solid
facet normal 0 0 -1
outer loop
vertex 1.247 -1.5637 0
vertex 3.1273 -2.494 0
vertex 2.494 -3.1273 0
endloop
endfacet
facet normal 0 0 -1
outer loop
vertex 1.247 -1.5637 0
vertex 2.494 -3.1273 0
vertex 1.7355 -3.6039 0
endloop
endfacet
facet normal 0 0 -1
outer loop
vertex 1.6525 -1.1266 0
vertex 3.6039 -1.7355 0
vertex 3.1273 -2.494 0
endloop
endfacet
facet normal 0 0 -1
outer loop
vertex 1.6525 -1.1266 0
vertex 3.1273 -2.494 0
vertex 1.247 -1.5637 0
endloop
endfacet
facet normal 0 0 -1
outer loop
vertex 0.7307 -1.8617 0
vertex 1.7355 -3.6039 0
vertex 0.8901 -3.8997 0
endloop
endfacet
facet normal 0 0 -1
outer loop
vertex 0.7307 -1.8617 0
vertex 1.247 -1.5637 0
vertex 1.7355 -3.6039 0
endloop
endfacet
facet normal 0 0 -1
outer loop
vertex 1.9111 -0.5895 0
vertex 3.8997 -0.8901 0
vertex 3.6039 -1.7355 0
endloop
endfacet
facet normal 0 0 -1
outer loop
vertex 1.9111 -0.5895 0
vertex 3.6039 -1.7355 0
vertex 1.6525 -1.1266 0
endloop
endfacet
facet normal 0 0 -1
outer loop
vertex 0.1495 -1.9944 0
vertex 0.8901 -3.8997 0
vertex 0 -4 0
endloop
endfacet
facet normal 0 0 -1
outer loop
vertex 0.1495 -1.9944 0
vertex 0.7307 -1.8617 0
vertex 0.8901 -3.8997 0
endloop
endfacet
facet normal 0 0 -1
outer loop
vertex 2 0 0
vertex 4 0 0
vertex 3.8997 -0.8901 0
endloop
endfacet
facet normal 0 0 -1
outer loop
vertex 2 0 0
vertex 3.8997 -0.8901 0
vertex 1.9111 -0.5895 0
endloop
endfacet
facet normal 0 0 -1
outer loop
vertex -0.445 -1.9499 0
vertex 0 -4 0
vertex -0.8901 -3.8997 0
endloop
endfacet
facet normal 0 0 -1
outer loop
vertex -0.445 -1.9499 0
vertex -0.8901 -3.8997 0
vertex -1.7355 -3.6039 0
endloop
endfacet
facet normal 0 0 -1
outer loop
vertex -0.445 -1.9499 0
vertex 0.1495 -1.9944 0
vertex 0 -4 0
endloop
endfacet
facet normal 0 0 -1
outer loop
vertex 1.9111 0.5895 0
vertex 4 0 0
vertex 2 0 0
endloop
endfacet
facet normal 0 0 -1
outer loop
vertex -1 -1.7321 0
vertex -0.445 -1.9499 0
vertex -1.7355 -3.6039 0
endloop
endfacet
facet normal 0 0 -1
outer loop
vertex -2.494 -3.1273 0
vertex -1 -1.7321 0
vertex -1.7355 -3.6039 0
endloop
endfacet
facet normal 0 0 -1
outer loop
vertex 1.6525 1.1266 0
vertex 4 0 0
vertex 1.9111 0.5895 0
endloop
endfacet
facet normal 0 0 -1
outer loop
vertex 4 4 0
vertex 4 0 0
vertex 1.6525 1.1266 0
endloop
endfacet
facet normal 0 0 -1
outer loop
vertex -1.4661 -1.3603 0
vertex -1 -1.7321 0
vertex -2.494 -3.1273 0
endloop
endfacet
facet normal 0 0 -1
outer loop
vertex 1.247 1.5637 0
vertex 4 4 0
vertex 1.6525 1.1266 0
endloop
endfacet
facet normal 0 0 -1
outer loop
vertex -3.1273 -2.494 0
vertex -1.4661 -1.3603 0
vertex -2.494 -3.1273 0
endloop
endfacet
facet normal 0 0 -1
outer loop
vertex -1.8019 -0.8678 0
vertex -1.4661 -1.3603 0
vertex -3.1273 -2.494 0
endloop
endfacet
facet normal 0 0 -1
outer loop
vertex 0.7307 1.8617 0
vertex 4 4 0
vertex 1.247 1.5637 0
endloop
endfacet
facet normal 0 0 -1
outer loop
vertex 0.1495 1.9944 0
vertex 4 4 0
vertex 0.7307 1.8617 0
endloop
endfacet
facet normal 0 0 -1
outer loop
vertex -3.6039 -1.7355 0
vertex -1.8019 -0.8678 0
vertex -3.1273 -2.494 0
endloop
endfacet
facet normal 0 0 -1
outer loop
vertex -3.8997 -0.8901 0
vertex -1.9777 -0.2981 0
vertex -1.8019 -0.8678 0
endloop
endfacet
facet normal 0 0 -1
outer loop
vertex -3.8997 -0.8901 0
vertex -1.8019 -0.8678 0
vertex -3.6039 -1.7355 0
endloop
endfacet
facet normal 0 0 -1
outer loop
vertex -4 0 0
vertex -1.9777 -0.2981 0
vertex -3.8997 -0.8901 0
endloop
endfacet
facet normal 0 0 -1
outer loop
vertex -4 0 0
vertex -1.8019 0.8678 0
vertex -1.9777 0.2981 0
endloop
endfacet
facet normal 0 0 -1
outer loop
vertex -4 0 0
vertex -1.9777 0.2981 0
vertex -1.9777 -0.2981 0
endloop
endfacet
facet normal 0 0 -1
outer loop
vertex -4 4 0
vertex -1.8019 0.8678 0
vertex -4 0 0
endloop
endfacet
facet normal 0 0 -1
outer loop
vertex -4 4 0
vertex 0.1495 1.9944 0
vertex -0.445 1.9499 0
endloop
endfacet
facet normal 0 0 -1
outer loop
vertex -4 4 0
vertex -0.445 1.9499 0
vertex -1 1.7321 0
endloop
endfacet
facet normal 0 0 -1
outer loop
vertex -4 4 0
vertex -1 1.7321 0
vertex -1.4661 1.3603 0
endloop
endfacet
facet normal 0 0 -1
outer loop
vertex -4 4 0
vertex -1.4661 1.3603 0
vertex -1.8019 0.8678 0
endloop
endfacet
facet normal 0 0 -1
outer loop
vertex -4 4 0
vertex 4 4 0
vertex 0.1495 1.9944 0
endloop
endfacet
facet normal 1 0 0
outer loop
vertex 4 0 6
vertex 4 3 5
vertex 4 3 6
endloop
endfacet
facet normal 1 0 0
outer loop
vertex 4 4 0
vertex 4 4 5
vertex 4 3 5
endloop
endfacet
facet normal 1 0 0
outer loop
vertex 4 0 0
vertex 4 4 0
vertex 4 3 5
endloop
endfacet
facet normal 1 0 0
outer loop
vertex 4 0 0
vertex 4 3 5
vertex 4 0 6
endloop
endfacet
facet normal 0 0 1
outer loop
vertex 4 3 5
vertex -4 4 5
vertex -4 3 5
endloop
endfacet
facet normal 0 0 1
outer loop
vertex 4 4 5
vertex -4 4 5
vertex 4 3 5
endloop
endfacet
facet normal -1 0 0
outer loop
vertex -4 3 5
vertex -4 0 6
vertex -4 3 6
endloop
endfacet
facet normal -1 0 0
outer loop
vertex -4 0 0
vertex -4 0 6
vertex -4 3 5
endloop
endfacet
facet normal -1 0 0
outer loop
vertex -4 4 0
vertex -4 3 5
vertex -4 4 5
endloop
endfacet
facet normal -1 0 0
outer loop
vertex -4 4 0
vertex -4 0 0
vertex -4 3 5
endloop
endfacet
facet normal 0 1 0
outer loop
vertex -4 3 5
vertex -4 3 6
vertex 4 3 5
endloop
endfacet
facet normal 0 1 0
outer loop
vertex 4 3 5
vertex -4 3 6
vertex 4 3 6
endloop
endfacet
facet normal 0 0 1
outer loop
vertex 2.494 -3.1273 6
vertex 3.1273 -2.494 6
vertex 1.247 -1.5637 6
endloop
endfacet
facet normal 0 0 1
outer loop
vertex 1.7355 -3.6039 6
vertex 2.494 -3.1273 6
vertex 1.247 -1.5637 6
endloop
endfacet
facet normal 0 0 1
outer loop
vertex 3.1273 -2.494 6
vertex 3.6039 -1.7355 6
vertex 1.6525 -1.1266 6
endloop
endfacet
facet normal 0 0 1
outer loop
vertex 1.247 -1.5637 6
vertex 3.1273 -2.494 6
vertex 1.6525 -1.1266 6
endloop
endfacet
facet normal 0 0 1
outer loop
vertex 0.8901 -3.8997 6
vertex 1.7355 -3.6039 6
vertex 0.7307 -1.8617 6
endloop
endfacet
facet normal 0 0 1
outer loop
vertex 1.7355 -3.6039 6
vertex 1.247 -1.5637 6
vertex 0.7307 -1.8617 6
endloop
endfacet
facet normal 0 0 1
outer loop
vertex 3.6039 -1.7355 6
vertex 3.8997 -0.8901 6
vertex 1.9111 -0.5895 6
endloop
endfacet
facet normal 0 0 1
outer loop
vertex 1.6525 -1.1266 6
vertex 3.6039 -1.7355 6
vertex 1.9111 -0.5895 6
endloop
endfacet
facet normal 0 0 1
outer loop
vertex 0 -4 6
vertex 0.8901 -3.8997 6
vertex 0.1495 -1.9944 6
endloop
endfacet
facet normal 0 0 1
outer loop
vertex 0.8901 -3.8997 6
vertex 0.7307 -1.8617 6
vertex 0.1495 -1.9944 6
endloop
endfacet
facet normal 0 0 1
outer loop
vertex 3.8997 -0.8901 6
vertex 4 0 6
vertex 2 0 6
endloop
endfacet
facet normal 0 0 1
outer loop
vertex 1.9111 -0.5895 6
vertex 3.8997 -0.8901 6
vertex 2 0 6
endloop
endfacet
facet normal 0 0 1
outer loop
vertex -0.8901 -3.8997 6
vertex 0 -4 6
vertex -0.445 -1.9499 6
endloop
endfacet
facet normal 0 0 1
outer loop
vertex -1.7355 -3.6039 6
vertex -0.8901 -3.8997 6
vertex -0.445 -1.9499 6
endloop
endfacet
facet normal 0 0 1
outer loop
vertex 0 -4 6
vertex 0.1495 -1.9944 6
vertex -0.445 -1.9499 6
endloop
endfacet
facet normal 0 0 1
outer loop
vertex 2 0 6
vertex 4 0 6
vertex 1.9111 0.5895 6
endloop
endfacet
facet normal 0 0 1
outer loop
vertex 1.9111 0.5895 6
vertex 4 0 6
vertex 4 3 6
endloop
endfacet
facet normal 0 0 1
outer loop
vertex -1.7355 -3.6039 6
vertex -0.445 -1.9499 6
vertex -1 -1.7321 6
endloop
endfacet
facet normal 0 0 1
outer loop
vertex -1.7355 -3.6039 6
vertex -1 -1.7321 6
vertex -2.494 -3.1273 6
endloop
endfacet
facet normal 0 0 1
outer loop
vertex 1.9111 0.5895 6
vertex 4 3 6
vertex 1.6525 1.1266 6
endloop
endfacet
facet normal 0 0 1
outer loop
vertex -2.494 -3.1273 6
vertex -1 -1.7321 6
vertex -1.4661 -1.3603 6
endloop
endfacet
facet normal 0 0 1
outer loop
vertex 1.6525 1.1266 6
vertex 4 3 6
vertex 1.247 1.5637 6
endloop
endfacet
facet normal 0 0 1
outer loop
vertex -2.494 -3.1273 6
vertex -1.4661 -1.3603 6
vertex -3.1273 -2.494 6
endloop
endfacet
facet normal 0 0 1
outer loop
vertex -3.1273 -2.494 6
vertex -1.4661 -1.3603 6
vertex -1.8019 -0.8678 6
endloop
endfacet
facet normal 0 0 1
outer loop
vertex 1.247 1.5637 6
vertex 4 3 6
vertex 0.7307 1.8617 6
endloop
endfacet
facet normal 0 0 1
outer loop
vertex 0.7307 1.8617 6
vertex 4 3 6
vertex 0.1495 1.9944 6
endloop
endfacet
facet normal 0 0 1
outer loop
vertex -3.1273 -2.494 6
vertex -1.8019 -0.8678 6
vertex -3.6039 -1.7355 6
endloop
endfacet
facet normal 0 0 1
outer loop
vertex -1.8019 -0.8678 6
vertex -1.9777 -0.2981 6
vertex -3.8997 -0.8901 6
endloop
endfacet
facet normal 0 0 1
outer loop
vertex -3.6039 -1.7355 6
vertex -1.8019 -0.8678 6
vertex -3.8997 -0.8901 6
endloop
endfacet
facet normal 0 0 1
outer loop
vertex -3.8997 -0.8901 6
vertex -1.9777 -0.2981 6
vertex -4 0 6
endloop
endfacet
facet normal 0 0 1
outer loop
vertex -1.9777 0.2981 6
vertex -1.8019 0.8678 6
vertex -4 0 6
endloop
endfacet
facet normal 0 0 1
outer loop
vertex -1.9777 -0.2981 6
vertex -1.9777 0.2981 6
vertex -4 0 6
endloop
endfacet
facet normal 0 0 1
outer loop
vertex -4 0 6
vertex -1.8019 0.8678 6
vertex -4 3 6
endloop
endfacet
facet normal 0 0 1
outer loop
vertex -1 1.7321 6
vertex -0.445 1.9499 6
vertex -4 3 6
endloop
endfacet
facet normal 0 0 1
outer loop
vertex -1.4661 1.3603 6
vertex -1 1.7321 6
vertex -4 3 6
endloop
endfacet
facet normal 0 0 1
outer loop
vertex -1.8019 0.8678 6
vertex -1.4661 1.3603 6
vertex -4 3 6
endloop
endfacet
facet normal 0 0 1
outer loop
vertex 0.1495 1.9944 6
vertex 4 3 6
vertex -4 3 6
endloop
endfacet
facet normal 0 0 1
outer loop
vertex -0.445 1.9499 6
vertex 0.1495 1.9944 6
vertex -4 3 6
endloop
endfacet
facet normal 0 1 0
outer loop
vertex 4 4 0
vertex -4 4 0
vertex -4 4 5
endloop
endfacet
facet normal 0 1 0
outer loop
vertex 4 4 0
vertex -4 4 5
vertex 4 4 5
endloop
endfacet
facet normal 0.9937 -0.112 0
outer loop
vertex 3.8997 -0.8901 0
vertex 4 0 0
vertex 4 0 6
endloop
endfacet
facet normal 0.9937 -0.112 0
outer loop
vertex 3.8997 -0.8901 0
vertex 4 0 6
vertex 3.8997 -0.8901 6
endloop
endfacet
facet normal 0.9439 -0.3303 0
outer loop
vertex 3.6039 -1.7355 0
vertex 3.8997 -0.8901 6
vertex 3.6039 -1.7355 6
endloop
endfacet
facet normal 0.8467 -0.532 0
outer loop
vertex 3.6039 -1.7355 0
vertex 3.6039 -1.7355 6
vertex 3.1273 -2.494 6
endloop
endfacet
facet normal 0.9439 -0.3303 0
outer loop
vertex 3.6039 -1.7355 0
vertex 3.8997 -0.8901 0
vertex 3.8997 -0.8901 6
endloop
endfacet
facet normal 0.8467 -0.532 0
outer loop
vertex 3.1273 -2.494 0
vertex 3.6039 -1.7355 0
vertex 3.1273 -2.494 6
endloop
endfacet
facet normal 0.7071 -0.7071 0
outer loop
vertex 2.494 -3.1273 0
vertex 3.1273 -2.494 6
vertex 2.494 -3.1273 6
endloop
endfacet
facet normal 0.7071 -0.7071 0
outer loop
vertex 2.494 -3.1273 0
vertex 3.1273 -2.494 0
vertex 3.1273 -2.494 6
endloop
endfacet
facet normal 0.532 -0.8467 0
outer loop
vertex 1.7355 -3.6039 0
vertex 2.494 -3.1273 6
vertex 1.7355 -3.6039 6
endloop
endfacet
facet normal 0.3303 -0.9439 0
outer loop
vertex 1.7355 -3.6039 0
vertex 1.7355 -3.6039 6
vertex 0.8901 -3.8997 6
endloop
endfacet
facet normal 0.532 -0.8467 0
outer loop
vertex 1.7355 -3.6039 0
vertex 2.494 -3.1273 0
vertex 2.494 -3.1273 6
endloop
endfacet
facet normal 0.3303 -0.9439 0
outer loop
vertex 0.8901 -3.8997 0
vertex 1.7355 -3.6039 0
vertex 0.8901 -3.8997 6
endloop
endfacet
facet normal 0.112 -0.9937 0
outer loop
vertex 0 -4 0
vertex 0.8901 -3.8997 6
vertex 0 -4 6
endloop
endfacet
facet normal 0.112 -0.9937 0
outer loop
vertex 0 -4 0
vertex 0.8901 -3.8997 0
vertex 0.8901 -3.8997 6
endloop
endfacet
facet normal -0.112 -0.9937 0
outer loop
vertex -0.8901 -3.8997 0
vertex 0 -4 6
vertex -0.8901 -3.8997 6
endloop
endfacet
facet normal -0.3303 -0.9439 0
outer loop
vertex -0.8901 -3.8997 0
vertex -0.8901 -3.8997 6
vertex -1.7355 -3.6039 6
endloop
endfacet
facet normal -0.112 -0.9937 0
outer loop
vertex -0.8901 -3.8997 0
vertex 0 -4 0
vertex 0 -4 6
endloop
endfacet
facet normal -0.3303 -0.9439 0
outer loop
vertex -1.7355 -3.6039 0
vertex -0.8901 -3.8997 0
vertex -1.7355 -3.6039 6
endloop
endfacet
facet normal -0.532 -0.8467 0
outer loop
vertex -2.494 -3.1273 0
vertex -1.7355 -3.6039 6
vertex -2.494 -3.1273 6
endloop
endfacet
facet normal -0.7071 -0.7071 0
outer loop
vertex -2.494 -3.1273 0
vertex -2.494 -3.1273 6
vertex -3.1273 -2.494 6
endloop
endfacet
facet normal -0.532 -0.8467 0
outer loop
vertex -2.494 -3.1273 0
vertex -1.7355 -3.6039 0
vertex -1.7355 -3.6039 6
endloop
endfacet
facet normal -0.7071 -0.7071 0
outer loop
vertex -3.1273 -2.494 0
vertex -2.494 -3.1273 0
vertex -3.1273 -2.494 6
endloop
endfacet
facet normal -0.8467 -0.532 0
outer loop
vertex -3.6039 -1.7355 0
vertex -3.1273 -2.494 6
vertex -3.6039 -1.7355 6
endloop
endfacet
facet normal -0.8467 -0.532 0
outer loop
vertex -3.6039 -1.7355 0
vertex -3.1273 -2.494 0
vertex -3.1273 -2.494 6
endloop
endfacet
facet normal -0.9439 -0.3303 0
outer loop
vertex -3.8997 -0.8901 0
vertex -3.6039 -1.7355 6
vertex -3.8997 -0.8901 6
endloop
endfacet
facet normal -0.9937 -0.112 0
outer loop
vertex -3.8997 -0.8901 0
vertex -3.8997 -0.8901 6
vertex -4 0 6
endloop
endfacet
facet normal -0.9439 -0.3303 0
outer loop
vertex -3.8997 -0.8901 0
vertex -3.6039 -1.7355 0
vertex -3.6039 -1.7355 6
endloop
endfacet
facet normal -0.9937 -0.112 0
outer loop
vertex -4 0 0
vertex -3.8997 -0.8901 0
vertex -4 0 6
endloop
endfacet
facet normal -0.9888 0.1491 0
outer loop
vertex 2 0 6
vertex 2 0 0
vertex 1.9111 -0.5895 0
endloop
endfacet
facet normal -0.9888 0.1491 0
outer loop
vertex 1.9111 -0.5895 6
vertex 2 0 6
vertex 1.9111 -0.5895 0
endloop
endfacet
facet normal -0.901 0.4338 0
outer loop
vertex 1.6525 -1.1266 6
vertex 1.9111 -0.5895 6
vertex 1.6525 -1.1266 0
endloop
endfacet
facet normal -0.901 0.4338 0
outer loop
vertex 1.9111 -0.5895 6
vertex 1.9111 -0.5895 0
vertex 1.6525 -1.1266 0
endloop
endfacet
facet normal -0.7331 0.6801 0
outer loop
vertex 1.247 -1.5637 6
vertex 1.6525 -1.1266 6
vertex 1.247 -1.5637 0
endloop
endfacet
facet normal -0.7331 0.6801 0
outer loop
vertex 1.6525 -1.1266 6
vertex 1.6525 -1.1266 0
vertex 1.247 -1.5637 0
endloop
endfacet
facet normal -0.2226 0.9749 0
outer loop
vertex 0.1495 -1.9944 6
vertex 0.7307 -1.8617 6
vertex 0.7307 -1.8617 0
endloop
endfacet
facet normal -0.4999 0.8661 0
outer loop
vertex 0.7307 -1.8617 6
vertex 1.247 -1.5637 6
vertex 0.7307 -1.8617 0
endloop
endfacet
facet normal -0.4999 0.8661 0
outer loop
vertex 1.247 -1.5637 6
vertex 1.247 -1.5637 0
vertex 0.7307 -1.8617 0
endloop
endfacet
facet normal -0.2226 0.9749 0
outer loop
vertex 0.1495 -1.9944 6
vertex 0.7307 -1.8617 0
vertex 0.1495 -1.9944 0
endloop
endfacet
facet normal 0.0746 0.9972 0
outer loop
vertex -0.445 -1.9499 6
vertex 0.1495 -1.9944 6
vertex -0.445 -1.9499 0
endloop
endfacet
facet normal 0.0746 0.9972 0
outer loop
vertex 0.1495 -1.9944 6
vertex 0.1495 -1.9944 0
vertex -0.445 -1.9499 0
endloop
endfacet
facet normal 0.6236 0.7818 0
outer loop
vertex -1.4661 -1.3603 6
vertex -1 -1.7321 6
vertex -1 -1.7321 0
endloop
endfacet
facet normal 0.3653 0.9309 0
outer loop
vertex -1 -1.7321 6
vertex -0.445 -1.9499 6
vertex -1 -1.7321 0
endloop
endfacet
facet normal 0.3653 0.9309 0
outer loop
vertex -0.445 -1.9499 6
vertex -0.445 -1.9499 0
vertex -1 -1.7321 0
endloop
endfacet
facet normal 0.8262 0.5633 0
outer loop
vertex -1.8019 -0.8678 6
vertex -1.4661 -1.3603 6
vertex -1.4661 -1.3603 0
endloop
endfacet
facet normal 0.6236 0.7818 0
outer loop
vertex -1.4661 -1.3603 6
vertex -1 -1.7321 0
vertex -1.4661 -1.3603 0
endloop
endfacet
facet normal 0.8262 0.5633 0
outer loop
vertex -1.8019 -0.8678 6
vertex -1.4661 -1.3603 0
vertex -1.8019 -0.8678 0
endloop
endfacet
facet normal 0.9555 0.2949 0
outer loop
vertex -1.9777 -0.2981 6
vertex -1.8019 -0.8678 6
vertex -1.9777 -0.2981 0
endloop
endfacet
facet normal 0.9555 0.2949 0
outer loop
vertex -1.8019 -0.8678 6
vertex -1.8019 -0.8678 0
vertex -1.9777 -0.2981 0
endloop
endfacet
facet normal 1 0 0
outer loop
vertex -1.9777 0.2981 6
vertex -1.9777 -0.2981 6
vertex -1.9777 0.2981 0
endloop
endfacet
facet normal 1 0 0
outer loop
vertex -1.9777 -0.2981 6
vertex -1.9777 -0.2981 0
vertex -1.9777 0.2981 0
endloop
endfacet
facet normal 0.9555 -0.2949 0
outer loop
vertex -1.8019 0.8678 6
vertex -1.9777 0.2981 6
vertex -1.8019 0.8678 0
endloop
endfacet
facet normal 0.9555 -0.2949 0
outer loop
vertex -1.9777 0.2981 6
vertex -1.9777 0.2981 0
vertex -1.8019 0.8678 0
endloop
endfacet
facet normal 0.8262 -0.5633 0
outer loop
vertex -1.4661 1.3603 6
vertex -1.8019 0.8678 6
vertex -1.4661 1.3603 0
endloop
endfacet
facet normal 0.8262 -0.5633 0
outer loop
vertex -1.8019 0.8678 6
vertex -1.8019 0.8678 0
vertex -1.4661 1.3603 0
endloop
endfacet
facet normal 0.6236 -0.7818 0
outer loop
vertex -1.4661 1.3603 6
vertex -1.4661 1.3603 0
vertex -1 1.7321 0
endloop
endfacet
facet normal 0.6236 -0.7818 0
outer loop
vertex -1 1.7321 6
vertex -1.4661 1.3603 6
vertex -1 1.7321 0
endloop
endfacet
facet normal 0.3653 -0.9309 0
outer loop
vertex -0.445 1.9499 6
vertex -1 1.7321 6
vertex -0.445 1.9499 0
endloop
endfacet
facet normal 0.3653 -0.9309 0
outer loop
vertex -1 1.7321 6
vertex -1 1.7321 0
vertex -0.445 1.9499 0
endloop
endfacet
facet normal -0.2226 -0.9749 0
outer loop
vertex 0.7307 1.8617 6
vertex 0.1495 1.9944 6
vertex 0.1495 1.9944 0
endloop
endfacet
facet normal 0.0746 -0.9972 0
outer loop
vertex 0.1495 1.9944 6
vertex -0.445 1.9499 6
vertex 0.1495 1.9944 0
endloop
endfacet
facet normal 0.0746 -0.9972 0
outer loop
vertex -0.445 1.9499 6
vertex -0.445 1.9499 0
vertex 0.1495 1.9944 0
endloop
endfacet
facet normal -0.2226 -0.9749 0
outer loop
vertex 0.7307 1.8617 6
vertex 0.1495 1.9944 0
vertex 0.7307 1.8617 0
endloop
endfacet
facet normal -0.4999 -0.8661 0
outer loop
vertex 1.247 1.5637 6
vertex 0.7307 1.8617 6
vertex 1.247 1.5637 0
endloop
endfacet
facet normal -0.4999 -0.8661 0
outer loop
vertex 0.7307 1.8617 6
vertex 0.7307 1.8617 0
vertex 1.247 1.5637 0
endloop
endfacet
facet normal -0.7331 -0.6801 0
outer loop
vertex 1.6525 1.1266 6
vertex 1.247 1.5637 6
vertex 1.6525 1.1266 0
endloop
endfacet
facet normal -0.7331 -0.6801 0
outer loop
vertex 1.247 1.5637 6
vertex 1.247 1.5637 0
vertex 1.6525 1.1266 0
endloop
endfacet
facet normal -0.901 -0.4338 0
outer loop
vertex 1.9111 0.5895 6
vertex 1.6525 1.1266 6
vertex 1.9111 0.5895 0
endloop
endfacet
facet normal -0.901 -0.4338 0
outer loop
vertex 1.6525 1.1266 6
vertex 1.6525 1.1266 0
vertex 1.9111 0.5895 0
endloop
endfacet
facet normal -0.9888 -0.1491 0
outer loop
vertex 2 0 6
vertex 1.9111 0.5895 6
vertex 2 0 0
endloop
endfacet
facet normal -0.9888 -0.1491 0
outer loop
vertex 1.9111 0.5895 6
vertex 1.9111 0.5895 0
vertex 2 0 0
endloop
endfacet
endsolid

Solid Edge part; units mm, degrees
sketch "Sketch1" plane through (0, 0, 0) normal (0, 0, 1) x (1, 0, 0)
  circle A0 centre (0, 0) radius 2
  line L0 (-4, 0) -> (-4, 4)
  line L1 (-4, 4) -> (4, 4)
  line L2 (4, 4) -> (4, 0)
  arc A1 (4, 0) -> (-4, 0) centre (0, 0) cw
extrude "Protrusion1" add sketch "Sketch1" along normal blind 6
sketch "Sketch2" plane through (0, 0, 6) normal (0, 0, 1) x (1, 0, 0)
  line L0 (-4, 3) -> (4, 3)
  line L1 (4, 3) -> (4, 4)
  line L2 (4, 4) -> (-4, 4)
  line L3 (-4, 4) -> (-4, 3)
  dimension "D1" = 1
extrude "Extrusionsausschnitt_1" cut sketch "Sketch2" against normal blind 1
